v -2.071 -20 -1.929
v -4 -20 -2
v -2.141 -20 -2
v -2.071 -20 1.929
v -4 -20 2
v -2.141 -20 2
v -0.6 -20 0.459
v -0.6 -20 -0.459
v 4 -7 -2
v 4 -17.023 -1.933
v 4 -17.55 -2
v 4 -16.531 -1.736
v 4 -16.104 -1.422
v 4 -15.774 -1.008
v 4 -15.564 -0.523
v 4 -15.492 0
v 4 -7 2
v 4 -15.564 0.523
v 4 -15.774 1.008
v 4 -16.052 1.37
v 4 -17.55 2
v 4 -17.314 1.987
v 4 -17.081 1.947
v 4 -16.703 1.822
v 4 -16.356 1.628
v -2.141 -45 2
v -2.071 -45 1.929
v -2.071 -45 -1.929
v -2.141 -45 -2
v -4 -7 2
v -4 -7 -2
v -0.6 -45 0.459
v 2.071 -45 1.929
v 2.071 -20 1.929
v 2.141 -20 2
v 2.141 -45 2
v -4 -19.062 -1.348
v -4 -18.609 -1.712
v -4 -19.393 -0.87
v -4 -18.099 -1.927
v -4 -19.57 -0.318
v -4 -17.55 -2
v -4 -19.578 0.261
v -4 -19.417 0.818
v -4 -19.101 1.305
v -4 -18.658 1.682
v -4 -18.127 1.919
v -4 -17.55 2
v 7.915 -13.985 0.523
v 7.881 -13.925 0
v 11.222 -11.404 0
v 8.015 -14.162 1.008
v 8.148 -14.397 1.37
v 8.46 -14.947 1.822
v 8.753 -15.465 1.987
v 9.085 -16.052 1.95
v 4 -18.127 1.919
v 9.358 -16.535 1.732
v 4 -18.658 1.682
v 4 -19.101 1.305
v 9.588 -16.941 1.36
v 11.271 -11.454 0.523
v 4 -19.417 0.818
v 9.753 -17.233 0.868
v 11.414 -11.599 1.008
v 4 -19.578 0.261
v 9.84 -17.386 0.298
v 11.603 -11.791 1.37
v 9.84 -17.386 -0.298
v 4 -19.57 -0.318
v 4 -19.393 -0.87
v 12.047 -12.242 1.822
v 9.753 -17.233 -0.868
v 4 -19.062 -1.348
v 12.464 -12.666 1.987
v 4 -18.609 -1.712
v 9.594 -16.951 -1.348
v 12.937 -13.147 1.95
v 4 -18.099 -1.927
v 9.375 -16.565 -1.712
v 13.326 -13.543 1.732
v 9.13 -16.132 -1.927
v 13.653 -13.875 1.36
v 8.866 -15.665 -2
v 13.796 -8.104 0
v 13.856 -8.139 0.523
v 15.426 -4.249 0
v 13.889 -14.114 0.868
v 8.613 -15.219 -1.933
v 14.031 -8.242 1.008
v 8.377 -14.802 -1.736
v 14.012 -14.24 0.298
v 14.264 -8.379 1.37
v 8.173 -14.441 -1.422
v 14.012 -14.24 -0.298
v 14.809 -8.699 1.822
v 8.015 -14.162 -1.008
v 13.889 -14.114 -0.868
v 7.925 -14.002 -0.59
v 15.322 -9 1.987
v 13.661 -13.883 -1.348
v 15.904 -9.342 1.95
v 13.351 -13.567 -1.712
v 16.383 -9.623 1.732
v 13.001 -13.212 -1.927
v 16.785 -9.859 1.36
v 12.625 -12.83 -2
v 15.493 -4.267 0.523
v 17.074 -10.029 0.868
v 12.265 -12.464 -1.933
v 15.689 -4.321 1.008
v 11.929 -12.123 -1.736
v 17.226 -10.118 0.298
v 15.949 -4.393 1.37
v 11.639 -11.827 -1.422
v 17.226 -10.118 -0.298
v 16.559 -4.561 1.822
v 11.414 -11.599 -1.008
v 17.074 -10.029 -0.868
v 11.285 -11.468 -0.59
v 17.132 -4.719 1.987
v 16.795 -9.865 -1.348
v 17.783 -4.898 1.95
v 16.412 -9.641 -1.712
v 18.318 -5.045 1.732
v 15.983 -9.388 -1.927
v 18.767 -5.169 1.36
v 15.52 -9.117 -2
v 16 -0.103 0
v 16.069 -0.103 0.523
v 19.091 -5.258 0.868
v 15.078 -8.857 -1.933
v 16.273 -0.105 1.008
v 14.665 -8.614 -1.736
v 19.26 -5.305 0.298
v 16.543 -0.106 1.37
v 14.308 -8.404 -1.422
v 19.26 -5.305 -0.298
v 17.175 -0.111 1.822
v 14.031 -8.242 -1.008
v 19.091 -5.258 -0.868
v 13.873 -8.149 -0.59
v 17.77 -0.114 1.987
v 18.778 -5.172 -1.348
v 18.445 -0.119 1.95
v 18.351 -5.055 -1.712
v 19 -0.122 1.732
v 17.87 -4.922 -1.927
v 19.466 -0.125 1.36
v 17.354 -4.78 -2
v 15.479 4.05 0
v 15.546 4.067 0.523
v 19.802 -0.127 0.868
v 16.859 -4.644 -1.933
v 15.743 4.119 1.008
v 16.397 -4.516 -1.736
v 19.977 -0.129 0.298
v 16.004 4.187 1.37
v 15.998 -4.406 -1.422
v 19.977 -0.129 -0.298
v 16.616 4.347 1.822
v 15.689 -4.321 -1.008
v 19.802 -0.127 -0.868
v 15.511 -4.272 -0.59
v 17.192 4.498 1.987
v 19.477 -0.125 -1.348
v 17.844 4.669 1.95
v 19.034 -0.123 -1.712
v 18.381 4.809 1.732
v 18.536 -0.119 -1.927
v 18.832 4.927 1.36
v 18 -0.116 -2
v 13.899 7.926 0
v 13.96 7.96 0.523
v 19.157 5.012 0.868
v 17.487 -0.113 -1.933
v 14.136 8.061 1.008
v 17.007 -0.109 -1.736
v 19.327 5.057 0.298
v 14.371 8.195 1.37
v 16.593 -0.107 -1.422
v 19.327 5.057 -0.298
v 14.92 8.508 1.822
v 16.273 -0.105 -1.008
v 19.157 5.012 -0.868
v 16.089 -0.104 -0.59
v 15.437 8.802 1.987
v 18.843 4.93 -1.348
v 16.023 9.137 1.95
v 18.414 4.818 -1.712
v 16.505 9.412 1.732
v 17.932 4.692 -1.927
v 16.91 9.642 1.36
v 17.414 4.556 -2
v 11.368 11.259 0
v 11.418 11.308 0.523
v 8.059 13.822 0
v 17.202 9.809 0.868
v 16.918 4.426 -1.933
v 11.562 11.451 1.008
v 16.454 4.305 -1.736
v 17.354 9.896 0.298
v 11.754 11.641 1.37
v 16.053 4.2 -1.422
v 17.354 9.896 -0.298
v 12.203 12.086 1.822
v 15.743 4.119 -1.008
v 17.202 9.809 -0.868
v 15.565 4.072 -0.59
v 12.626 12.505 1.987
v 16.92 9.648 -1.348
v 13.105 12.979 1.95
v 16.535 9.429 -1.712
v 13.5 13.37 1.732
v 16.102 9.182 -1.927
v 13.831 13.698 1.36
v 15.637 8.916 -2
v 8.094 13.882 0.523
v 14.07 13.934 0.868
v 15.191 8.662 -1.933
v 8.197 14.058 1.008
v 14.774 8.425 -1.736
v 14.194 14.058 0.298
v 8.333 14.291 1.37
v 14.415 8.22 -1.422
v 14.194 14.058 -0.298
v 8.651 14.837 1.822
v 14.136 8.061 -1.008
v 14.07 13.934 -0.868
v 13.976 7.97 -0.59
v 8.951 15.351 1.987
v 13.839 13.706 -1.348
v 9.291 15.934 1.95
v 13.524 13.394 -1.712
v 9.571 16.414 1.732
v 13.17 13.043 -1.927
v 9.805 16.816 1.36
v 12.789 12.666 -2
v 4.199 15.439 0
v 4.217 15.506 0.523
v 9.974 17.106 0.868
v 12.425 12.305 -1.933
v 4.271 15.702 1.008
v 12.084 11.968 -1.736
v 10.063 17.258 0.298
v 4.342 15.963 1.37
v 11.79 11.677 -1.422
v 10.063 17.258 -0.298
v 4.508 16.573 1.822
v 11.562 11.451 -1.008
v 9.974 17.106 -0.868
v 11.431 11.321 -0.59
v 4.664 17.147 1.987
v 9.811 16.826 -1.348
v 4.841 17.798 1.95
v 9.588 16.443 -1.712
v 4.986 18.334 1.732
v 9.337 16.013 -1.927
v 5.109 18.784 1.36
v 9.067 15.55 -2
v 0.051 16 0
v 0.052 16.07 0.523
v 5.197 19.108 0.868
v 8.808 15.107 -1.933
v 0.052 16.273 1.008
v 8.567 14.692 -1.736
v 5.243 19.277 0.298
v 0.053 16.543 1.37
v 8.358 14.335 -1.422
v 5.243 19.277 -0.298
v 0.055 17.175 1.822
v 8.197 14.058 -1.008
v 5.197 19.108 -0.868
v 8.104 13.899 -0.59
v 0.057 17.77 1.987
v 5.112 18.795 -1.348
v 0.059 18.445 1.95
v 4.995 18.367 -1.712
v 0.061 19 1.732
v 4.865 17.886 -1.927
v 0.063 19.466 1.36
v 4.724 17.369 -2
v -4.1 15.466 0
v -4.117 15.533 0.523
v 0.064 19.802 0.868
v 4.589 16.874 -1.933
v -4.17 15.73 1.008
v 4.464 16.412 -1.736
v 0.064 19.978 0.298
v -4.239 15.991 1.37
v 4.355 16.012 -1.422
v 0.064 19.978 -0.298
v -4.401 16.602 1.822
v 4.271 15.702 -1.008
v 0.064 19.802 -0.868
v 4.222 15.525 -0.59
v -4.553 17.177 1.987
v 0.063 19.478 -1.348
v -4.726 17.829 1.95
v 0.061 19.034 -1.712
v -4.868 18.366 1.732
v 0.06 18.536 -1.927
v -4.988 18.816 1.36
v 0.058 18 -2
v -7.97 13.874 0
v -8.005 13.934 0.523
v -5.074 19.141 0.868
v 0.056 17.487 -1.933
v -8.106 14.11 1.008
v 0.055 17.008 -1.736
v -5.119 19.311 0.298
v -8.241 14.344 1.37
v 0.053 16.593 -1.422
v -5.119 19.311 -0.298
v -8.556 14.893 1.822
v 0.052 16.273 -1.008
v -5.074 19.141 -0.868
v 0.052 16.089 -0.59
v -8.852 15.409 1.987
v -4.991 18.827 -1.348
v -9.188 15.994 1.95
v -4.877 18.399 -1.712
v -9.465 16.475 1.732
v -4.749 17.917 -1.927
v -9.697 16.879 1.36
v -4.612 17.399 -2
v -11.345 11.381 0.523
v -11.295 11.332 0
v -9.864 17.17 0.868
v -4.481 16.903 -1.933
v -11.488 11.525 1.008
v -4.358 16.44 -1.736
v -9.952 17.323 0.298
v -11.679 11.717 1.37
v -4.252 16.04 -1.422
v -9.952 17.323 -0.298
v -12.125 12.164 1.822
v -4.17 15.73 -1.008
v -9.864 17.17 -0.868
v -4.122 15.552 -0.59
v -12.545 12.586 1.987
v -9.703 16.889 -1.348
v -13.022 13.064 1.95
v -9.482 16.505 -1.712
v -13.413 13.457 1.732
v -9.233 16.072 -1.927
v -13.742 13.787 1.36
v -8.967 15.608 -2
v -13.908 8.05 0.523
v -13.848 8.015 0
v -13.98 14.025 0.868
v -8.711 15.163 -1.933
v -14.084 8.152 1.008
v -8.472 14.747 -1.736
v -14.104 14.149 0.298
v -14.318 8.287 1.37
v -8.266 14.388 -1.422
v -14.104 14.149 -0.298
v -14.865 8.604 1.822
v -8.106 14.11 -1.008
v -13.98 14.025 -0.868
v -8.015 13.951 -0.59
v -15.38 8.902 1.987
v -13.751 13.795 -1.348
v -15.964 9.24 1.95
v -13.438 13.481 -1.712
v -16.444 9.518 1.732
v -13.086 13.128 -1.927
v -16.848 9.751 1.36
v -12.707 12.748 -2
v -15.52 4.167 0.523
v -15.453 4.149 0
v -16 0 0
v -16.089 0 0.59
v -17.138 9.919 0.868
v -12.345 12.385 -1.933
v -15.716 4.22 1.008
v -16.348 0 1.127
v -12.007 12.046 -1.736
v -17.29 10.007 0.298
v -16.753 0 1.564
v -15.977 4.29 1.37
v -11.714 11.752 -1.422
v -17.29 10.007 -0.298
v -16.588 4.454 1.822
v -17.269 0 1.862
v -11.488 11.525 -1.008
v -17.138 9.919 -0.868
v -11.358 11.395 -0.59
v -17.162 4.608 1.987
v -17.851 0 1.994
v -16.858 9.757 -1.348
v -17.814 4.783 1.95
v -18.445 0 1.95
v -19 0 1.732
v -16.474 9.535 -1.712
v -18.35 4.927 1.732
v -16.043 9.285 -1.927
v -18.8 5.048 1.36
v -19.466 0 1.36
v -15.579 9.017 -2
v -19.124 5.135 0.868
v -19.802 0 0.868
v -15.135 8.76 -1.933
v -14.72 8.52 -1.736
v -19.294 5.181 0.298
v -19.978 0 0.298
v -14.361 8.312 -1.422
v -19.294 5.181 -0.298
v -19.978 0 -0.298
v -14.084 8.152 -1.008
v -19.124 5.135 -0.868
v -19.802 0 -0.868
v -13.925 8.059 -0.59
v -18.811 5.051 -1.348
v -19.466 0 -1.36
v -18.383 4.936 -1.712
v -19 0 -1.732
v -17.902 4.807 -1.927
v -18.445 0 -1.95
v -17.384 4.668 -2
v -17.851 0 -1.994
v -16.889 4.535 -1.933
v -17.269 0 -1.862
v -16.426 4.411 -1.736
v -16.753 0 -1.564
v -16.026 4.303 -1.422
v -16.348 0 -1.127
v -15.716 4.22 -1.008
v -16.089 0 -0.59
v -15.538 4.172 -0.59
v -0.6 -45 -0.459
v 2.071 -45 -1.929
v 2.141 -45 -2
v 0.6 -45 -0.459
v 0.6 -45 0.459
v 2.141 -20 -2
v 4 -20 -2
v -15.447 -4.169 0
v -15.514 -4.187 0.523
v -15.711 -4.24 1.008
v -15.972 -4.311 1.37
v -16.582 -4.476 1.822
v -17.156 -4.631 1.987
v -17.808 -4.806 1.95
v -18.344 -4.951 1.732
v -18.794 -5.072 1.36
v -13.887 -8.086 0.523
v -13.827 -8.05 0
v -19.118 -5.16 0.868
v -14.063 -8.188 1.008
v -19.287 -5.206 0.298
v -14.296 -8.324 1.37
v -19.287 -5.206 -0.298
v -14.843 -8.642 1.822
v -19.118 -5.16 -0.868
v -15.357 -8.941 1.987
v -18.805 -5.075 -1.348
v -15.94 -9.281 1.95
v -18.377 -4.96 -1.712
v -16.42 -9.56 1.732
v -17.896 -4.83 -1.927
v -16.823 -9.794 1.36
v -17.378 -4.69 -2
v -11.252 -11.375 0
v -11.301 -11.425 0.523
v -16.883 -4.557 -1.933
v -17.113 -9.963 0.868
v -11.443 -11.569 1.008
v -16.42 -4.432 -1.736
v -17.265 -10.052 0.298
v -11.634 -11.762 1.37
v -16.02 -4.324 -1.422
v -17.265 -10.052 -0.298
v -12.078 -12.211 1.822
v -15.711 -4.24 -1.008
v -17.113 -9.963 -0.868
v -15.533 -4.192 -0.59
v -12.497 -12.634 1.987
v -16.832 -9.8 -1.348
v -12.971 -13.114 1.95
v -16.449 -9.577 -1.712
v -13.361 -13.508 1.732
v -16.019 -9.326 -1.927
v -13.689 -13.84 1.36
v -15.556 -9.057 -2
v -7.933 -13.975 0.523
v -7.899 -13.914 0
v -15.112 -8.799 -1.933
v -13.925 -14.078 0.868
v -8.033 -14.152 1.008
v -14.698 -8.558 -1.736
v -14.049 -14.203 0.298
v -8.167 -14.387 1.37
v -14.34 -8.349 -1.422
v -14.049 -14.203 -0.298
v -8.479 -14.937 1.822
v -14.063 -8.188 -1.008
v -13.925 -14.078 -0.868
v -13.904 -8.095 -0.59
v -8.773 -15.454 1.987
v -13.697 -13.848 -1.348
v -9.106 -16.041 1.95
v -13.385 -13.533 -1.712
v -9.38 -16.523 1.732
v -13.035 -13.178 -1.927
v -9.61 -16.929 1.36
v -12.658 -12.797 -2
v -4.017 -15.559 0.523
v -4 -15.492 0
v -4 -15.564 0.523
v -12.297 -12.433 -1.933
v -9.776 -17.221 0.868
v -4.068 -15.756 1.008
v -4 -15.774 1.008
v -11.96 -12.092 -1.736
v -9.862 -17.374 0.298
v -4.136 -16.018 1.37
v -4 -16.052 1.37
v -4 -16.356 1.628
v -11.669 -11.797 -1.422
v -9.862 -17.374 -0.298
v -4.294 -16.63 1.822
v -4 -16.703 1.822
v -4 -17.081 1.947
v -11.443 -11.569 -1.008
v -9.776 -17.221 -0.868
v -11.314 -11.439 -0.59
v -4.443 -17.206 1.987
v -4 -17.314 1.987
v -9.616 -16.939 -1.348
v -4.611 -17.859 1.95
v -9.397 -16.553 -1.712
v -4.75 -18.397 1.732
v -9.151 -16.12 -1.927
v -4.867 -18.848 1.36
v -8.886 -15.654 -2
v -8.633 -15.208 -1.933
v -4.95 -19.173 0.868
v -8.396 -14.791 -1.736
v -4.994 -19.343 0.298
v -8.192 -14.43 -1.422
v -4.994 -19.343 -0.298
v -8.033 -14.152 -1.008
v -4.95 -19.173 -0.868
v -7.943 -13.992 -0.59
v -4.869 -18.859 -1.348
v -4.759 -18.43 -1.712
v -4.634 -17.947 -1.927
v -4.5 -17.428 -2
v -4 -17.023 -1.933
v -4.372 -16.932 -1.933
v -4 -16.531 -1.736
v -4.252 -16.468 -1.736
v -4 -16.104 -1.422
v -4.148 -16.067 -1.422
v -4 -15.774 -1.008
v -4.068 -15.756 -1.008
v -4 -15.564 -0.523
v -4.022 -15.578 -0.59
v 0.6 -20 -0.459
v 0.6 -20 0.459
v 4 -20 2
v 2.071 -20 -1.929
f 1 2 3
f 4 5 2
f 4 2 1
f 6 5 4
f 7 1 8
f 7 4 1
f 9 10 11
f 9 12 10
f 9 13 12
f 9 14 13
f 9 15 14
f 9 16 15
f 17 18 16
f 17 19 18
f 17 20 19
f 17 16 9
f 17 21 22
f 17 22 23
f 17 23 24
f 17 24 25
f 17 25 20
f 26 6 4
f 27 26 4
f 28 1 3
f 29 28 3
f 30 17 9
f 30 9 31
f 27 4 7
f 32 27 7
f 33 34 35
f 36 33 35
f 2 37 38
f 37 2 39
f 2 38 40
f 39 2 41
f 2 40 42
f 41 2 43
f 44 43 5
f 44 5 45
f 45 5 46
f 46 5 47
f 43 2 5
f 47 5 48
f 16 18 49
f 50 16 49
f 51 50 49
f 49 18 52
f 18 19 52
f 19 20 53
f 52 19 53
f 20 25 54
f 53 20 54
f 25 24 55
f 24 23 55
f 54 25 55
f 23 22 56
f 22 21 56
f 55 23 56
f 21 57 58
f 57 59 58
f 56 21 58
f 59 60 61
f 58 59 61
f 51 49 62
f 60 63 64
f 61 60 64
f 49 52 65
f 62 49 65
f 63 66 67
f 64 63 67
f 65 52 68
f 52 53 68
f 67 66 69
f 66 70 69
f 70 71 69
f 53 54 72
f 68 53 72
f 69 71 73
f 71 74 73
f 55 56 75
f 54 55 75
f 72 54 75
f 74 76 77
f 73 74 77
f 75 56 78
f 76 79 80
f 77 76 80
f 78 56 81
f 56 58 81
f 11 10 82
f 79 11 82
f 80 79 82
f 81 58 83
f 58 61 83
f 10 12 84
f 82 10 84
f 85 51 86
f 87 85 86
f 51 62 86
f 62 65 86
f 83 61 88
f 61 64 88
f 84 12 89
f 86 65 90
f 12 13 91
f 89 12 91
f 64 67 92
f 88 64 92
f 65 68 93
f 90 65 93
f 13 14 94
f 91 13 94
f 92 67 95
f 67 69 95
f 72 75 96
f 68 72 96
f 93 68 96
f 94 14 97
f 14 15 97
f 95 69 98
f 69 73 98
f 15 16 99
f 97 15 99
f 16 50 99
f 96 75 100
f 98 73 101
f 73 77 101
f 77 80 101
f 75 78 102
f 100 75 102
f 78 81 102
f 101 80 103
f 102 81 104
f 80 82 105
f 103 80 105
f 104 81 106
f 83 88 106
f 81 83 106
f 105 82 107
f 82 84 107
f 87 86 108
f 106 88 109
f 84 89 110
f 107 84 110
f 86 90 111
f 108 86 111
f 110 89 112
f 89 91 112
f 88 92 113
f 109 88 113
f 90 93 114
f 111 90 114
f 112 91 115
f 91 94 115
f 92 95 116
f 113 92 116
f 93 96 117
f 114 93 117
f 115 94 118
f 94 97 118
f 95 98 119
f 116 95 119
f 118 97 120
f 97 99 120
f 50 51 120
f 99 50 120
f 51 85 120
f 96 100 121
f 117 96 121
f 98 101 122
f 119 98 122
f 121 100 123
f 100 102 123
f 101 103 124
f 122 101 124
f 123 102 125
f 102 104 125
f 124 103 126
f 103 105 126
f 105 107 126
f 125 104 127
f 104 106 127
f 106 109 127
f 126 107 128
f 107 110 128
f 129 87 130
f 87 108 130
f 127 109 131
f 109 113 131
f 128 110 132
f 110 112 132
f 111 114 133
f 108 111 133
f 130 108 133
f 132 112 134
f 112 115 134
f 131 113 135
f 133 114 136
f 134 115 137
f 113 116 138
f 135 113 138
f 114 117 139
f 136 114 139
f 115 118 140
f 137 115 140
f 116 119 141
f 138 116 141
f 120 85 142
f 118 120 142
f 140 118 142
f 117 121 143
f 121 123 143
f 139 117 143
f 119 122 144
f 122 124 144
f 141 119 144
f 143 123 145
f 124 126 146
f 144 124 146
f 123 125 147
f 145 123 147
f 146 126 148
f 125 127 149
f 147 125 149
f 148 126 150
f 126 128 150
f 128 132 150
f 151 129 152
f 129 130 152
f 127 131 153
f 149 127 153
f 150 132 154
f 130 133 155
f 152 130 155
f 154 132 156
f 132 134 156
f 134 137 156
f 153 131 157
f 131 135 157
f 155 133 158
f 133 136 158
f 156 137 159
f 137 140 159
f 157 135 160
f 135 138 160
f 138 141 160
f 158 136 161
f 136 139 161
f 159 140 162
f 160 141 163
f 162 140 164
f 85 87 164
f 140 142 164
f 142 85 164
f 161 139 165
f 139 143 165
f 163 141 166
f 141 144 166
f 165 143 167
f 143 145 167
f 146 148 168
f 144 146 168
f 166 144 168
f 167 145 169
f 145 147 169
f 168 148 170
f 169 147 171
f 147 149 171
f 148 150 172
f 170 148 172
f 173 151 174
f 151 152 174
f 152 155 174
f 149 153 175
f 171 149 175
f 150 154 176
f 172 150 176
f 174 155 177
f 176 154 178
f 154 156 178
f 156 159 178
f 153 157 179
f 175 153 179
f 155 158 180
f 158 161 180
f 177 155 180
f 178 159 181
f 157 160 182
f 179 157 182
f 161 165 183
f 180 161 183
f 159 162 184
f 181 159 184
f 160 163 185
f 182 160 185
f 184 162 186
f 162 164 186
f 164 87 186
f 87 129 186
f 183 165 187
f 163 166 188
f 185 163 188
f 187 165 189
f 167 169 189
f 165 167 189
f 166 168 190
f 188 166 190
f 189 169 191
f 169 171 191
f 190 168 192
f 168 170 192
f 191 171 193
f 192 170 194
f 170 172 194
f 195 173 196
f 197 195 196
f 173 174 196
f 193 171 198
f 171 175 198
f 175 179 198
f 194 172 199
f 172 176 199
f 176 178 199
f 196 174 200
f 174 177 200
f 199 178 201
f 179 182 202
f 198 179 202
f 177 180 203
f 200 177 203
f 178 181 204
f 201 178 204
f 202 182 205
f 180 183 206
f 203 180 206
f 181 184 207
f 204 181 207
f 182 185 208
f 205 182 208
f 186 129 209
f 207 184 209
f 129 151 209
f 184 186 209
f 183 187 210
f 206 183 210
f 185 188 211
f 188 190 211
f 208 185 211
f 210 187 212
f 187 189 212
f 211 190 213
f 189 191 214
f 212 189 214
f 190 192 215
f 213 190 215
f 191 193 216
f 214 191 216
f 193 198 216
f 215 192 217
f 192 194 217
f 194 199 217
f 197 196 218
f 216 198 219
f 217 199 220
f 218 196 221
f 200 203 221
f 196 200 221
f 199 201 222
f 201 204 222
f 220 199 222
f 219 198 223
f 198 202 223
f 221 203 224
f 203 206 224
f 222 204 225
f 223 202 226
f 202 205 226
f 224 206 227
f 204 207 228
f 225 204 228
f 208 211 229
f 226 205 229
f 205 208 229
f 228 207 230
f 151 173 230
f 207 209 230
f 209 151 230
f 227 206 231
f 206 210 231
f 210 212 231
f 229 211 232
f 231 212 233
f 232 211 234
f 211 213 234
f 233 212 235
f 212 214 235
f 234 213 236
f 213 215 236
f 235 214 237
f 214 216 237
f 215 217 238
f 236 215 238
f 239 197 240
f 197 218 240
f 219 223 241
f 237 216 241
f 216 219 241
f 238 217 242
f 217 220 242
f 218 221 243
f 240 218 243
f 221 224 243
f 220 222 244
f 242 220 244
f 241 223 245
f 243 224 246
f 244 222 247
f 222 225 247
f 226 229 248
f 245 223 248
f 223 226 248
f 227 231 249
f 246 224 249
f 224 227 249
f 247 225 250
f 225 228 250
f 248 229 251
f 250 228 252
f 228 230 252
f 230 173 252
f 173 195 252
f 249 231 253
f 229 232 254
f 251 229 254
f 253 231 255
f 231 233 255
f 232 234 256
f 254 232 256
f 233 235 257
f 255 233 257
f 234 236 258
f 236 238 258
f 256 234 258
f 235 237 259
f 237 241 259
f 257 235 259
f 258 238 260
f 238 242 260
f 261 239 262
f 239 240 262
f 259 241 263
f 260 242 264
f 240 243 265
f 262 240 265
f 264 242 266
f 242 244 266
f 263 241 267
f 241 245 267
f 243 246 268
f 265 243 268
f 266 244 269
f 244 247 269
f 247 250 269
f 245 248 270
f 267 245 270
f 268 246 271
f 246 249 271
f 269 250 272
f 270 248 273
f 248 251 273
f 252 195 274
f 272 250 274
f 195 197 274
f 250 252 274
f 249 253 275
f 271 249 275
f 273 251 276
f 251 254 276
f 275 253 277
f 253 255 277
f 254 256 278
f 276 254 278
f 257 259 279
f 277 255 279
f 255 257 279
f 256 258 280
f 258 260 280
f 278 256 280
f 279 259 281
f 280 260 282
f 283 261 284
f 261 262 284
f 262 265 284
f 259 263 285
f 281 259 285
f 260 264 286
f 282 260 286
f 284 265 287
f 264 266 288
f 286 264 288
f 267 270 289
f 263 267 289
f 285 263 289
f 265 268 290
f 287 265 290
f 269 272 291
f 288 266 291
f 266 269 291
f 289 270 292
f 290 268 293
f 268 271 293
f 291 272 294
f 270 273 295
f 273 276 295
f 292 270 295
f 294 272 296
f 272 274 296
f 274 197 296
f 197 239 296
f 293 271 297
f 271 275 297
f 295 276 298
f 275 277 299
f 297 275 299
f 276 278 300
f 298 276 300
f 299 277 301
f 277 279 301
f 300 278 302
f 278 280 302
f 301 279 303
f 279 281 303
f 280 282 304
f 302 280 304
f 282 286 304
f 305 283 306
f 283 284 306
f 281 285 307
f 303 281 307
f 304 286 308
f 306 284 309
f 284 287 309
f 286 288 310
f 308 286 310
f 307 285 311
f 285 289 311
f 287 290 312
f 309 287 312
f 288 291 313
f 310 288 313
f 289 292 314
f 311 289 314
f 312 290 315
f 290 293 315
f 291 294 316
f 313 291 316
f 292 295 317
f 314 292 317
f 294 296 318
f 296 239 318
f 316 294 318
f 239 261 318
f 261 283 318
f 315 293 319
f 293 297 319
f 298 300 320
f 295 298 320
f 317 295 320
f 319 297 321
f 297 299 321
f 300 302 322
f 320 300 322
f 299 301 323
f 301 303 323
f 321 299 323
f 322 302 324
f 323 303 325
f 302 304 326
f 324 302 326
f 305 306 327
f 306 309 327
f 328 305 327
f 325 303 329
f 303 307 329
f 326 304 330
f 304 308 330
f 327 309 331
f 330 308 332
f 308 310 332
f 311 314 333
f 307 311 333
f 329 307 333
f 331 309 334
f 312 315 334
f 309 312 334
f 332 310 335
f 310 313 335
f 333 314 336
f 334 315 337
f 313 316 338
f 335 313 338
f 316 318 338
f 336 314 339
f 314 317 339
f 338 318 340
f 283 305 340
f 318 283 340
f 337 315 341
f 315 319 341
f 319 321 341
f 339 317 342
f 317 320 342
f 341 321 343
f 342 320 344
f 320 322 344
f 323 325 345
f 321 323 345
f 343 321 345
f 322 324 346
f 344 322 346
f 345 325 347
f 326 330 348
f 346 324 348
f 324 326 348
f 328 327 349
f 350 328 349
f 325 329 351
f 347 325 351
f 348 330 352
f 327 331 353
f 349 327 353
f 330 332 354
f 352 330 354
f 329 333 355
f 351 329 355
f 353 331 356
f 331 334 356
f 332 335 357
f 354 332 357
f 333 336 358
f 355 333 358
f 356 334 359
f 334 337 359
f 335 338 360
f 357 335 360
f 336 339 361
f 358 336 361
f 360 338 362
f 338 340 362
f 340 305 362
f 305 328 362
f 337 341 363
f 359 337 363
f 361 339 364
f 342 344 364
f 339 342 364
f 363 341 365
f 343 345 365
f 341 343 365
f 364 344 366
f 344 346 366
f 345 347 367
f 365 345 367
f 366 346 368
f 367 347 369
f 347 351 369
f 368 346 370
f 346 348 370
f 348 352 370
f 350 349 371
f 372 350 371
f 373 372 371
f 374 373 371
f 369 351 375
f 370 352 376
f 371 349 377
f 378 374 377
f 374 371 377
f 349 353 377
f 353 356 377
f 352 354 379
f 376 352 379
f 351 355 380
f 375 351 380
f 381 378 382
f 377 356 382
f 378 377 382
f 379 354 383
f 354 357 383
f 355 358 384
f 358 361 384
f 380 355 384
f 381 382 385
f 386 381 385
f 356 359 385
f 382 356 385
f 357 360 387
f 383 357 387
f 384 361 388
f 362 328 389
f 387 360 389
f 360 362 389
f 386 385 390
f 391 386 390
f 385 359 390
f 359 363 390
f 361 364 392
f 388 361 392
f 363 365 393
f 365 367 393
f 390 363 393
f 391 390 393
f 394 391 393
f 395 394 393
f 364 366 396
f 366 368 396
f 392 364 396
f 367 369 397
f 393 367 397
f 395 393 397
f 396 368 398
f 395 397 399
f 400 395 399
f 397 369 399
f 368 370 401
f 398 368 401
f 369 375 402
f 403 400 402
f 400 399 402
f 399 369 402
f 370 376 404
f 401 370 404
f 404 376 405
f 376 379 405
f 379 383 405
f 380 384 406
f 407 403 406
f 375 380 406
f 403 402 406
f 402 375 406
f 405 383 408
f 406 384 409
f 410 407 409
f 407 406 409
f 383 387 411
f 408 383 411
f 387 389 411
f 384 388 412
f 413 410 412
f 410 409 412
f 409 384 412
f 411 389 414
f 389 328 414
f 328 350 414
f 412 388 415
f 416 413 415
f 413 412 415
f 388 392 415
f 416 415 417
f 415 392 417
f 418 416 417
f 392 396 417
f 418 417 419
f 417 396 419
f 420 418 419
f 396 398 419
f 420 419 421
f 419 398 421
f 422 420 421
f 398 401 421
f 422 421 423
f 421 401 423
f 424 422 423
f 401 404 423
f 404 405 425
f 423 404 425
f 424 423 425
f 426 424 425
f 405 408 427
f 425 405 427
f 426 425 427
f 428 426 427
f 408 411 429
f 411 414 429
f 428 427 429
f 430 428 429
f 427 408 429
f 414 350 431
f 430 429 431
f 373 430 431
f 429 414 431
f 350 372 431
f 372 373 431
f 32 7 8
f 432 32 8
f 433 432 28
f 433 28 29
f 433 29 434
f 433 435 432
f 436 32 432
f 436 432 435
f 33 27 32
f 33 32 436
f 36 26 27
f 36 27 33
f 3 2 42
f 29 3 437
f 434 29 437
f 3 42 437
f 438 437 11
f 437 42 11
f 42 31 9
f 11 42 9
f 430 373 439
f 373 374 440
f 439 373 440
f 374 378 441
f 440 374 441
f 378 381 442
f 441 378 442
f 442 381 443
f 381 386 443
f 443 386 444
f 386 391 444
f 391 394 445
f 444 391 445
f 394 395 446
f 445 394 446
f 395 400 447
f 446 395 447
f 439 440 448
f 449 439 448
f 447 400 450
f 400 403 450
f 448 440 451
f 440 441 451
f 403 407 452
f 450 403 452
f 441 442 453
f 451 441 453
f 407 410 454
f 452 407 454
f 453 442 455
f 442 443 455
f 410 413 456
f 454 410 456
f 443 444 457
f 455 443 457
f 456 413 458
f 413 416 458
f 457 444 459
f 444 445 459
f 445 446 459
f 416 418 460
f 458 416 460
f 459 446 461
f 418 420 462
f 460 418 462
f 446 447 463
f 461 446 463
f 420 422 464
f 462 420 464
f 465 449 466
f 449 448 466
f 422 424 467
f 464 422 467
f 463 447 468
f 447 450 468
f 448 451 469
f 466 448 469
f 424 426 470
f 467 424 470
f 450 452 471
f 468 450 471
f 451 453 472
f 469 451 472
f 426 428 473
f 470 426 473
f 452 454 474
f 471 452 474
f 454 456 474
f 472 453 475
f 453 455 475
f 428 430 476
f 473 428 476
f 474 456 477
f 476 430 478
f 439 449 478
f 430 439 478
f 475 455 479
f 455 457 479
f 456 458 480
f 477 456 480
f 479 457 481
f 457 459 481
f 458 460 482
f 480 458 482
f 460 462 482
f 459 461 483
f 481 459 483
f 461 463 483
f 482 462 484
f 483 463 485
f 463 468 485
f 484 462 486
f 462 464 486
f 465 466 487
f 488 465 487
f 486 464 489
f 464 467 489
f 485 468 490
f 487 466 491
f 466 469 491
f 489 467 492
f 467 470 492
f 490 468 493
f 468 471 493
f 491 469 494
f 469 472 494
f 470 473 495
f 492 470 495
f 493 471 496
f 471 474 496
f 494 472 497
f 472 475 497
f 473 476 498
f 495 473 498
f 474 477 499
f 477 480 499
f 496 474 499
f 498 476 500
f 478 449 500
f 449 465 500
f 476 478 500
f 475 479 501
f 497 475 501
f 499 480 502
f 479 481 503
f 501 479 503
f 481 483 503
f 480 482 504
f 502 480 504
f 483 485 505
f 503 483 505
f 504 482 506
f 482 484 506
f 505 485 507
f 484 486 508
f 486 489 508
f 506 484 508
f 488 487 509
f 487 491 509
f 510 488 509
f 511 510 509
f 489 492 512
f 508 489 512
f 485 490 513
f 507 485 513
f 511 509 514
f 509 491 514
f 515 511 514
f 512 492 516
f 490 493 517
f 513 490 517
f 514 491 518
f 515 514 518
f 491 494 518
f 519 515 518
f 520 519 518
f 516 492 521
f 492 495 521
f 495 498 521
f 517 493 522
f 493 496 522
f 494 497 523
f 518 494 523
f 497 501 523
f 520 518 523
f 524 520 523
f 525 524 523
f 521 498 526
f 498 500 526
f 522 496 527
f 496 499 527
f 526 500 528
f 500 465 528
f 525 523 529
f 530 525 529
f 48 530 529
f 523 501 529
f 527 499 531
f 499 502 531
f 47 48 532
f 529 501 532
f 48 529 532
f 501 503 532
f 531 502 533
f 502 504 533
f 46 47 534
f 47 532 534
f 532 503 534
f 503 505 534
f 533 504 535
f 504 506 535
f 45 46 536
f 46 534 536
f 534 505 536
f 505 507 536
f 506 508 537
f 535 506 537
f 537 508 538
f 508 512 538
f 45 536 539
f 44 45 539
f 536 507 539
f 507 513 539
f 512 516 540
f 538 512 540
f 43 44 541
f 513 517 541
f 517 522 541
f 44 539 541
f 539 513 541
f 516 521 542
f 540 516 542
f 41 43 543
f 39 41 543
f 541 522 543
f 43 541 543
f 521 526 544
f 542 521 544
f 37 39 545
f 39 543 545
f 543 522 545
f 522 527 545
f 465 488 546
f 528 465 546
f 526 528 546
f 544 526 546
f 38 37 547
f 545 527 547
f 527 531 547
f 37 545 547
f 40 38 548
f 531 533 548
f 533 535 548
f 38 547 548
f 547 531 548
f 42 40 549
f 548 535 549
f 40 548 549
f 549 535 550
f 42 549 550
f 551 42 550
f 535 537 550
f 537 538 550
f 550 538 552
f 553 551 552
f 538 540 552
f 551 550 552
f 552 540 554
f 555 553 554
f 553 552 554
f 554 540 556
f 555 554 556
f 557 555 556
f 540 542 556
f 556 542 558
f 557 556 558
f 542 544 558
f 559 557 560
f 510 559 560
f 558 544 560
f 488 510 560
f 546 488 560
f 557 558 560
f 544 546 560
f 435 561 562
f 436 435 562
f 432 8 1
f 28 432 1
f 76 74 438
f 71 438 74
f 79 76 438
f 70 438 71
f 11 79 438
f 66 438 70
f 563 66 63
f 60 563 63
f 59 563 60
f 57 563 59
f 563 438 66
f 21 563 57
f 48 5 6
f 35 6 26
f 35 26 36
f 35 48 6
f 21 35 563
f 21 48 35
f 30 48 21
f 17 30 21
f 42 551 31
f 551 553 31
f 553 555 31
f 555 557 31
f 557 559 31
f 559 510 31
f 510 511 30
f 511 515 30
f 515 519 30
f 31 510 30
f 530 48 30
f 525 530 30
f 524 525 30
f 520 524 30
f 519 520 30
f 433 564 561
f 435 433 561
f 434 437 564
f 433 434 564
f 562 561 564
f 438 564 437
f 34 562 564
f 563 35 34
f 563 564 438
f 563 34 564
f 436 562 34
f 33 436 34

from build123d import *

# Parameters (mm, degrees)
F0_R     = 2
F2_W     = 4
F2_H     = 13
F3_DEPTH = 2
F5_DEPTH = 25


with BuildPart() as f1:
    # F0 (on Front) → F1 (revolve)
    with BuildSketch(Plane.XZ):
        with Locations((-18, 0)):
            Circle(F0_R)
    revolve(axis=Axis((0, 0, 11.250001), (0, 0, 1)))

    # F2 (on Top) → F3 (join, symmetric)
    with BuildSketch(Plane.XY):
        with Locations((2, -13.5)):
            Rectangle(F2_W, F2_H)
        with Locations((-2, -13.5)):
            Rectangle(F2_W, F2_H)
    extrude(amount=F3_DEPTH, both=True)

    # F4 (on face) → F5 (join)
    with BuildSketch(Plane.XZ.offset(20)):
        Polygon((0.5, 0.5), (2, 2), (0.5, 2), (0, 2), (-0.5, 2), (-2, 2), (-0.5, 0.5), (-0.5, -0.5), (-2, -2), (-0.5, -2), (0.5, -2), (2, -2), (0.5, -0.5), align=None)
        Polygon((2.070711, 1.929289), (2.141421, 2), (2, 2), (0.5, 0.5), (0.5, -0.5), (2, -2), (2.141421, -2), (2.070711, -1.929289), (0.6, -0.458579), (0.6, 0.458579), align=None)
        Polygon((-0.5, 0.5), (-2, 2), (-2.141421, 2), (-2.070711, 1.929289), (-0.6, 0.458579), (-0.6, -0.458579), (-2.070711, -1.929289), (-2.141421, -2), (-2, -2), (-0.5, -0.5), align=None)
    extrude(amount=F5_DEPTH)


solid = f1.part
